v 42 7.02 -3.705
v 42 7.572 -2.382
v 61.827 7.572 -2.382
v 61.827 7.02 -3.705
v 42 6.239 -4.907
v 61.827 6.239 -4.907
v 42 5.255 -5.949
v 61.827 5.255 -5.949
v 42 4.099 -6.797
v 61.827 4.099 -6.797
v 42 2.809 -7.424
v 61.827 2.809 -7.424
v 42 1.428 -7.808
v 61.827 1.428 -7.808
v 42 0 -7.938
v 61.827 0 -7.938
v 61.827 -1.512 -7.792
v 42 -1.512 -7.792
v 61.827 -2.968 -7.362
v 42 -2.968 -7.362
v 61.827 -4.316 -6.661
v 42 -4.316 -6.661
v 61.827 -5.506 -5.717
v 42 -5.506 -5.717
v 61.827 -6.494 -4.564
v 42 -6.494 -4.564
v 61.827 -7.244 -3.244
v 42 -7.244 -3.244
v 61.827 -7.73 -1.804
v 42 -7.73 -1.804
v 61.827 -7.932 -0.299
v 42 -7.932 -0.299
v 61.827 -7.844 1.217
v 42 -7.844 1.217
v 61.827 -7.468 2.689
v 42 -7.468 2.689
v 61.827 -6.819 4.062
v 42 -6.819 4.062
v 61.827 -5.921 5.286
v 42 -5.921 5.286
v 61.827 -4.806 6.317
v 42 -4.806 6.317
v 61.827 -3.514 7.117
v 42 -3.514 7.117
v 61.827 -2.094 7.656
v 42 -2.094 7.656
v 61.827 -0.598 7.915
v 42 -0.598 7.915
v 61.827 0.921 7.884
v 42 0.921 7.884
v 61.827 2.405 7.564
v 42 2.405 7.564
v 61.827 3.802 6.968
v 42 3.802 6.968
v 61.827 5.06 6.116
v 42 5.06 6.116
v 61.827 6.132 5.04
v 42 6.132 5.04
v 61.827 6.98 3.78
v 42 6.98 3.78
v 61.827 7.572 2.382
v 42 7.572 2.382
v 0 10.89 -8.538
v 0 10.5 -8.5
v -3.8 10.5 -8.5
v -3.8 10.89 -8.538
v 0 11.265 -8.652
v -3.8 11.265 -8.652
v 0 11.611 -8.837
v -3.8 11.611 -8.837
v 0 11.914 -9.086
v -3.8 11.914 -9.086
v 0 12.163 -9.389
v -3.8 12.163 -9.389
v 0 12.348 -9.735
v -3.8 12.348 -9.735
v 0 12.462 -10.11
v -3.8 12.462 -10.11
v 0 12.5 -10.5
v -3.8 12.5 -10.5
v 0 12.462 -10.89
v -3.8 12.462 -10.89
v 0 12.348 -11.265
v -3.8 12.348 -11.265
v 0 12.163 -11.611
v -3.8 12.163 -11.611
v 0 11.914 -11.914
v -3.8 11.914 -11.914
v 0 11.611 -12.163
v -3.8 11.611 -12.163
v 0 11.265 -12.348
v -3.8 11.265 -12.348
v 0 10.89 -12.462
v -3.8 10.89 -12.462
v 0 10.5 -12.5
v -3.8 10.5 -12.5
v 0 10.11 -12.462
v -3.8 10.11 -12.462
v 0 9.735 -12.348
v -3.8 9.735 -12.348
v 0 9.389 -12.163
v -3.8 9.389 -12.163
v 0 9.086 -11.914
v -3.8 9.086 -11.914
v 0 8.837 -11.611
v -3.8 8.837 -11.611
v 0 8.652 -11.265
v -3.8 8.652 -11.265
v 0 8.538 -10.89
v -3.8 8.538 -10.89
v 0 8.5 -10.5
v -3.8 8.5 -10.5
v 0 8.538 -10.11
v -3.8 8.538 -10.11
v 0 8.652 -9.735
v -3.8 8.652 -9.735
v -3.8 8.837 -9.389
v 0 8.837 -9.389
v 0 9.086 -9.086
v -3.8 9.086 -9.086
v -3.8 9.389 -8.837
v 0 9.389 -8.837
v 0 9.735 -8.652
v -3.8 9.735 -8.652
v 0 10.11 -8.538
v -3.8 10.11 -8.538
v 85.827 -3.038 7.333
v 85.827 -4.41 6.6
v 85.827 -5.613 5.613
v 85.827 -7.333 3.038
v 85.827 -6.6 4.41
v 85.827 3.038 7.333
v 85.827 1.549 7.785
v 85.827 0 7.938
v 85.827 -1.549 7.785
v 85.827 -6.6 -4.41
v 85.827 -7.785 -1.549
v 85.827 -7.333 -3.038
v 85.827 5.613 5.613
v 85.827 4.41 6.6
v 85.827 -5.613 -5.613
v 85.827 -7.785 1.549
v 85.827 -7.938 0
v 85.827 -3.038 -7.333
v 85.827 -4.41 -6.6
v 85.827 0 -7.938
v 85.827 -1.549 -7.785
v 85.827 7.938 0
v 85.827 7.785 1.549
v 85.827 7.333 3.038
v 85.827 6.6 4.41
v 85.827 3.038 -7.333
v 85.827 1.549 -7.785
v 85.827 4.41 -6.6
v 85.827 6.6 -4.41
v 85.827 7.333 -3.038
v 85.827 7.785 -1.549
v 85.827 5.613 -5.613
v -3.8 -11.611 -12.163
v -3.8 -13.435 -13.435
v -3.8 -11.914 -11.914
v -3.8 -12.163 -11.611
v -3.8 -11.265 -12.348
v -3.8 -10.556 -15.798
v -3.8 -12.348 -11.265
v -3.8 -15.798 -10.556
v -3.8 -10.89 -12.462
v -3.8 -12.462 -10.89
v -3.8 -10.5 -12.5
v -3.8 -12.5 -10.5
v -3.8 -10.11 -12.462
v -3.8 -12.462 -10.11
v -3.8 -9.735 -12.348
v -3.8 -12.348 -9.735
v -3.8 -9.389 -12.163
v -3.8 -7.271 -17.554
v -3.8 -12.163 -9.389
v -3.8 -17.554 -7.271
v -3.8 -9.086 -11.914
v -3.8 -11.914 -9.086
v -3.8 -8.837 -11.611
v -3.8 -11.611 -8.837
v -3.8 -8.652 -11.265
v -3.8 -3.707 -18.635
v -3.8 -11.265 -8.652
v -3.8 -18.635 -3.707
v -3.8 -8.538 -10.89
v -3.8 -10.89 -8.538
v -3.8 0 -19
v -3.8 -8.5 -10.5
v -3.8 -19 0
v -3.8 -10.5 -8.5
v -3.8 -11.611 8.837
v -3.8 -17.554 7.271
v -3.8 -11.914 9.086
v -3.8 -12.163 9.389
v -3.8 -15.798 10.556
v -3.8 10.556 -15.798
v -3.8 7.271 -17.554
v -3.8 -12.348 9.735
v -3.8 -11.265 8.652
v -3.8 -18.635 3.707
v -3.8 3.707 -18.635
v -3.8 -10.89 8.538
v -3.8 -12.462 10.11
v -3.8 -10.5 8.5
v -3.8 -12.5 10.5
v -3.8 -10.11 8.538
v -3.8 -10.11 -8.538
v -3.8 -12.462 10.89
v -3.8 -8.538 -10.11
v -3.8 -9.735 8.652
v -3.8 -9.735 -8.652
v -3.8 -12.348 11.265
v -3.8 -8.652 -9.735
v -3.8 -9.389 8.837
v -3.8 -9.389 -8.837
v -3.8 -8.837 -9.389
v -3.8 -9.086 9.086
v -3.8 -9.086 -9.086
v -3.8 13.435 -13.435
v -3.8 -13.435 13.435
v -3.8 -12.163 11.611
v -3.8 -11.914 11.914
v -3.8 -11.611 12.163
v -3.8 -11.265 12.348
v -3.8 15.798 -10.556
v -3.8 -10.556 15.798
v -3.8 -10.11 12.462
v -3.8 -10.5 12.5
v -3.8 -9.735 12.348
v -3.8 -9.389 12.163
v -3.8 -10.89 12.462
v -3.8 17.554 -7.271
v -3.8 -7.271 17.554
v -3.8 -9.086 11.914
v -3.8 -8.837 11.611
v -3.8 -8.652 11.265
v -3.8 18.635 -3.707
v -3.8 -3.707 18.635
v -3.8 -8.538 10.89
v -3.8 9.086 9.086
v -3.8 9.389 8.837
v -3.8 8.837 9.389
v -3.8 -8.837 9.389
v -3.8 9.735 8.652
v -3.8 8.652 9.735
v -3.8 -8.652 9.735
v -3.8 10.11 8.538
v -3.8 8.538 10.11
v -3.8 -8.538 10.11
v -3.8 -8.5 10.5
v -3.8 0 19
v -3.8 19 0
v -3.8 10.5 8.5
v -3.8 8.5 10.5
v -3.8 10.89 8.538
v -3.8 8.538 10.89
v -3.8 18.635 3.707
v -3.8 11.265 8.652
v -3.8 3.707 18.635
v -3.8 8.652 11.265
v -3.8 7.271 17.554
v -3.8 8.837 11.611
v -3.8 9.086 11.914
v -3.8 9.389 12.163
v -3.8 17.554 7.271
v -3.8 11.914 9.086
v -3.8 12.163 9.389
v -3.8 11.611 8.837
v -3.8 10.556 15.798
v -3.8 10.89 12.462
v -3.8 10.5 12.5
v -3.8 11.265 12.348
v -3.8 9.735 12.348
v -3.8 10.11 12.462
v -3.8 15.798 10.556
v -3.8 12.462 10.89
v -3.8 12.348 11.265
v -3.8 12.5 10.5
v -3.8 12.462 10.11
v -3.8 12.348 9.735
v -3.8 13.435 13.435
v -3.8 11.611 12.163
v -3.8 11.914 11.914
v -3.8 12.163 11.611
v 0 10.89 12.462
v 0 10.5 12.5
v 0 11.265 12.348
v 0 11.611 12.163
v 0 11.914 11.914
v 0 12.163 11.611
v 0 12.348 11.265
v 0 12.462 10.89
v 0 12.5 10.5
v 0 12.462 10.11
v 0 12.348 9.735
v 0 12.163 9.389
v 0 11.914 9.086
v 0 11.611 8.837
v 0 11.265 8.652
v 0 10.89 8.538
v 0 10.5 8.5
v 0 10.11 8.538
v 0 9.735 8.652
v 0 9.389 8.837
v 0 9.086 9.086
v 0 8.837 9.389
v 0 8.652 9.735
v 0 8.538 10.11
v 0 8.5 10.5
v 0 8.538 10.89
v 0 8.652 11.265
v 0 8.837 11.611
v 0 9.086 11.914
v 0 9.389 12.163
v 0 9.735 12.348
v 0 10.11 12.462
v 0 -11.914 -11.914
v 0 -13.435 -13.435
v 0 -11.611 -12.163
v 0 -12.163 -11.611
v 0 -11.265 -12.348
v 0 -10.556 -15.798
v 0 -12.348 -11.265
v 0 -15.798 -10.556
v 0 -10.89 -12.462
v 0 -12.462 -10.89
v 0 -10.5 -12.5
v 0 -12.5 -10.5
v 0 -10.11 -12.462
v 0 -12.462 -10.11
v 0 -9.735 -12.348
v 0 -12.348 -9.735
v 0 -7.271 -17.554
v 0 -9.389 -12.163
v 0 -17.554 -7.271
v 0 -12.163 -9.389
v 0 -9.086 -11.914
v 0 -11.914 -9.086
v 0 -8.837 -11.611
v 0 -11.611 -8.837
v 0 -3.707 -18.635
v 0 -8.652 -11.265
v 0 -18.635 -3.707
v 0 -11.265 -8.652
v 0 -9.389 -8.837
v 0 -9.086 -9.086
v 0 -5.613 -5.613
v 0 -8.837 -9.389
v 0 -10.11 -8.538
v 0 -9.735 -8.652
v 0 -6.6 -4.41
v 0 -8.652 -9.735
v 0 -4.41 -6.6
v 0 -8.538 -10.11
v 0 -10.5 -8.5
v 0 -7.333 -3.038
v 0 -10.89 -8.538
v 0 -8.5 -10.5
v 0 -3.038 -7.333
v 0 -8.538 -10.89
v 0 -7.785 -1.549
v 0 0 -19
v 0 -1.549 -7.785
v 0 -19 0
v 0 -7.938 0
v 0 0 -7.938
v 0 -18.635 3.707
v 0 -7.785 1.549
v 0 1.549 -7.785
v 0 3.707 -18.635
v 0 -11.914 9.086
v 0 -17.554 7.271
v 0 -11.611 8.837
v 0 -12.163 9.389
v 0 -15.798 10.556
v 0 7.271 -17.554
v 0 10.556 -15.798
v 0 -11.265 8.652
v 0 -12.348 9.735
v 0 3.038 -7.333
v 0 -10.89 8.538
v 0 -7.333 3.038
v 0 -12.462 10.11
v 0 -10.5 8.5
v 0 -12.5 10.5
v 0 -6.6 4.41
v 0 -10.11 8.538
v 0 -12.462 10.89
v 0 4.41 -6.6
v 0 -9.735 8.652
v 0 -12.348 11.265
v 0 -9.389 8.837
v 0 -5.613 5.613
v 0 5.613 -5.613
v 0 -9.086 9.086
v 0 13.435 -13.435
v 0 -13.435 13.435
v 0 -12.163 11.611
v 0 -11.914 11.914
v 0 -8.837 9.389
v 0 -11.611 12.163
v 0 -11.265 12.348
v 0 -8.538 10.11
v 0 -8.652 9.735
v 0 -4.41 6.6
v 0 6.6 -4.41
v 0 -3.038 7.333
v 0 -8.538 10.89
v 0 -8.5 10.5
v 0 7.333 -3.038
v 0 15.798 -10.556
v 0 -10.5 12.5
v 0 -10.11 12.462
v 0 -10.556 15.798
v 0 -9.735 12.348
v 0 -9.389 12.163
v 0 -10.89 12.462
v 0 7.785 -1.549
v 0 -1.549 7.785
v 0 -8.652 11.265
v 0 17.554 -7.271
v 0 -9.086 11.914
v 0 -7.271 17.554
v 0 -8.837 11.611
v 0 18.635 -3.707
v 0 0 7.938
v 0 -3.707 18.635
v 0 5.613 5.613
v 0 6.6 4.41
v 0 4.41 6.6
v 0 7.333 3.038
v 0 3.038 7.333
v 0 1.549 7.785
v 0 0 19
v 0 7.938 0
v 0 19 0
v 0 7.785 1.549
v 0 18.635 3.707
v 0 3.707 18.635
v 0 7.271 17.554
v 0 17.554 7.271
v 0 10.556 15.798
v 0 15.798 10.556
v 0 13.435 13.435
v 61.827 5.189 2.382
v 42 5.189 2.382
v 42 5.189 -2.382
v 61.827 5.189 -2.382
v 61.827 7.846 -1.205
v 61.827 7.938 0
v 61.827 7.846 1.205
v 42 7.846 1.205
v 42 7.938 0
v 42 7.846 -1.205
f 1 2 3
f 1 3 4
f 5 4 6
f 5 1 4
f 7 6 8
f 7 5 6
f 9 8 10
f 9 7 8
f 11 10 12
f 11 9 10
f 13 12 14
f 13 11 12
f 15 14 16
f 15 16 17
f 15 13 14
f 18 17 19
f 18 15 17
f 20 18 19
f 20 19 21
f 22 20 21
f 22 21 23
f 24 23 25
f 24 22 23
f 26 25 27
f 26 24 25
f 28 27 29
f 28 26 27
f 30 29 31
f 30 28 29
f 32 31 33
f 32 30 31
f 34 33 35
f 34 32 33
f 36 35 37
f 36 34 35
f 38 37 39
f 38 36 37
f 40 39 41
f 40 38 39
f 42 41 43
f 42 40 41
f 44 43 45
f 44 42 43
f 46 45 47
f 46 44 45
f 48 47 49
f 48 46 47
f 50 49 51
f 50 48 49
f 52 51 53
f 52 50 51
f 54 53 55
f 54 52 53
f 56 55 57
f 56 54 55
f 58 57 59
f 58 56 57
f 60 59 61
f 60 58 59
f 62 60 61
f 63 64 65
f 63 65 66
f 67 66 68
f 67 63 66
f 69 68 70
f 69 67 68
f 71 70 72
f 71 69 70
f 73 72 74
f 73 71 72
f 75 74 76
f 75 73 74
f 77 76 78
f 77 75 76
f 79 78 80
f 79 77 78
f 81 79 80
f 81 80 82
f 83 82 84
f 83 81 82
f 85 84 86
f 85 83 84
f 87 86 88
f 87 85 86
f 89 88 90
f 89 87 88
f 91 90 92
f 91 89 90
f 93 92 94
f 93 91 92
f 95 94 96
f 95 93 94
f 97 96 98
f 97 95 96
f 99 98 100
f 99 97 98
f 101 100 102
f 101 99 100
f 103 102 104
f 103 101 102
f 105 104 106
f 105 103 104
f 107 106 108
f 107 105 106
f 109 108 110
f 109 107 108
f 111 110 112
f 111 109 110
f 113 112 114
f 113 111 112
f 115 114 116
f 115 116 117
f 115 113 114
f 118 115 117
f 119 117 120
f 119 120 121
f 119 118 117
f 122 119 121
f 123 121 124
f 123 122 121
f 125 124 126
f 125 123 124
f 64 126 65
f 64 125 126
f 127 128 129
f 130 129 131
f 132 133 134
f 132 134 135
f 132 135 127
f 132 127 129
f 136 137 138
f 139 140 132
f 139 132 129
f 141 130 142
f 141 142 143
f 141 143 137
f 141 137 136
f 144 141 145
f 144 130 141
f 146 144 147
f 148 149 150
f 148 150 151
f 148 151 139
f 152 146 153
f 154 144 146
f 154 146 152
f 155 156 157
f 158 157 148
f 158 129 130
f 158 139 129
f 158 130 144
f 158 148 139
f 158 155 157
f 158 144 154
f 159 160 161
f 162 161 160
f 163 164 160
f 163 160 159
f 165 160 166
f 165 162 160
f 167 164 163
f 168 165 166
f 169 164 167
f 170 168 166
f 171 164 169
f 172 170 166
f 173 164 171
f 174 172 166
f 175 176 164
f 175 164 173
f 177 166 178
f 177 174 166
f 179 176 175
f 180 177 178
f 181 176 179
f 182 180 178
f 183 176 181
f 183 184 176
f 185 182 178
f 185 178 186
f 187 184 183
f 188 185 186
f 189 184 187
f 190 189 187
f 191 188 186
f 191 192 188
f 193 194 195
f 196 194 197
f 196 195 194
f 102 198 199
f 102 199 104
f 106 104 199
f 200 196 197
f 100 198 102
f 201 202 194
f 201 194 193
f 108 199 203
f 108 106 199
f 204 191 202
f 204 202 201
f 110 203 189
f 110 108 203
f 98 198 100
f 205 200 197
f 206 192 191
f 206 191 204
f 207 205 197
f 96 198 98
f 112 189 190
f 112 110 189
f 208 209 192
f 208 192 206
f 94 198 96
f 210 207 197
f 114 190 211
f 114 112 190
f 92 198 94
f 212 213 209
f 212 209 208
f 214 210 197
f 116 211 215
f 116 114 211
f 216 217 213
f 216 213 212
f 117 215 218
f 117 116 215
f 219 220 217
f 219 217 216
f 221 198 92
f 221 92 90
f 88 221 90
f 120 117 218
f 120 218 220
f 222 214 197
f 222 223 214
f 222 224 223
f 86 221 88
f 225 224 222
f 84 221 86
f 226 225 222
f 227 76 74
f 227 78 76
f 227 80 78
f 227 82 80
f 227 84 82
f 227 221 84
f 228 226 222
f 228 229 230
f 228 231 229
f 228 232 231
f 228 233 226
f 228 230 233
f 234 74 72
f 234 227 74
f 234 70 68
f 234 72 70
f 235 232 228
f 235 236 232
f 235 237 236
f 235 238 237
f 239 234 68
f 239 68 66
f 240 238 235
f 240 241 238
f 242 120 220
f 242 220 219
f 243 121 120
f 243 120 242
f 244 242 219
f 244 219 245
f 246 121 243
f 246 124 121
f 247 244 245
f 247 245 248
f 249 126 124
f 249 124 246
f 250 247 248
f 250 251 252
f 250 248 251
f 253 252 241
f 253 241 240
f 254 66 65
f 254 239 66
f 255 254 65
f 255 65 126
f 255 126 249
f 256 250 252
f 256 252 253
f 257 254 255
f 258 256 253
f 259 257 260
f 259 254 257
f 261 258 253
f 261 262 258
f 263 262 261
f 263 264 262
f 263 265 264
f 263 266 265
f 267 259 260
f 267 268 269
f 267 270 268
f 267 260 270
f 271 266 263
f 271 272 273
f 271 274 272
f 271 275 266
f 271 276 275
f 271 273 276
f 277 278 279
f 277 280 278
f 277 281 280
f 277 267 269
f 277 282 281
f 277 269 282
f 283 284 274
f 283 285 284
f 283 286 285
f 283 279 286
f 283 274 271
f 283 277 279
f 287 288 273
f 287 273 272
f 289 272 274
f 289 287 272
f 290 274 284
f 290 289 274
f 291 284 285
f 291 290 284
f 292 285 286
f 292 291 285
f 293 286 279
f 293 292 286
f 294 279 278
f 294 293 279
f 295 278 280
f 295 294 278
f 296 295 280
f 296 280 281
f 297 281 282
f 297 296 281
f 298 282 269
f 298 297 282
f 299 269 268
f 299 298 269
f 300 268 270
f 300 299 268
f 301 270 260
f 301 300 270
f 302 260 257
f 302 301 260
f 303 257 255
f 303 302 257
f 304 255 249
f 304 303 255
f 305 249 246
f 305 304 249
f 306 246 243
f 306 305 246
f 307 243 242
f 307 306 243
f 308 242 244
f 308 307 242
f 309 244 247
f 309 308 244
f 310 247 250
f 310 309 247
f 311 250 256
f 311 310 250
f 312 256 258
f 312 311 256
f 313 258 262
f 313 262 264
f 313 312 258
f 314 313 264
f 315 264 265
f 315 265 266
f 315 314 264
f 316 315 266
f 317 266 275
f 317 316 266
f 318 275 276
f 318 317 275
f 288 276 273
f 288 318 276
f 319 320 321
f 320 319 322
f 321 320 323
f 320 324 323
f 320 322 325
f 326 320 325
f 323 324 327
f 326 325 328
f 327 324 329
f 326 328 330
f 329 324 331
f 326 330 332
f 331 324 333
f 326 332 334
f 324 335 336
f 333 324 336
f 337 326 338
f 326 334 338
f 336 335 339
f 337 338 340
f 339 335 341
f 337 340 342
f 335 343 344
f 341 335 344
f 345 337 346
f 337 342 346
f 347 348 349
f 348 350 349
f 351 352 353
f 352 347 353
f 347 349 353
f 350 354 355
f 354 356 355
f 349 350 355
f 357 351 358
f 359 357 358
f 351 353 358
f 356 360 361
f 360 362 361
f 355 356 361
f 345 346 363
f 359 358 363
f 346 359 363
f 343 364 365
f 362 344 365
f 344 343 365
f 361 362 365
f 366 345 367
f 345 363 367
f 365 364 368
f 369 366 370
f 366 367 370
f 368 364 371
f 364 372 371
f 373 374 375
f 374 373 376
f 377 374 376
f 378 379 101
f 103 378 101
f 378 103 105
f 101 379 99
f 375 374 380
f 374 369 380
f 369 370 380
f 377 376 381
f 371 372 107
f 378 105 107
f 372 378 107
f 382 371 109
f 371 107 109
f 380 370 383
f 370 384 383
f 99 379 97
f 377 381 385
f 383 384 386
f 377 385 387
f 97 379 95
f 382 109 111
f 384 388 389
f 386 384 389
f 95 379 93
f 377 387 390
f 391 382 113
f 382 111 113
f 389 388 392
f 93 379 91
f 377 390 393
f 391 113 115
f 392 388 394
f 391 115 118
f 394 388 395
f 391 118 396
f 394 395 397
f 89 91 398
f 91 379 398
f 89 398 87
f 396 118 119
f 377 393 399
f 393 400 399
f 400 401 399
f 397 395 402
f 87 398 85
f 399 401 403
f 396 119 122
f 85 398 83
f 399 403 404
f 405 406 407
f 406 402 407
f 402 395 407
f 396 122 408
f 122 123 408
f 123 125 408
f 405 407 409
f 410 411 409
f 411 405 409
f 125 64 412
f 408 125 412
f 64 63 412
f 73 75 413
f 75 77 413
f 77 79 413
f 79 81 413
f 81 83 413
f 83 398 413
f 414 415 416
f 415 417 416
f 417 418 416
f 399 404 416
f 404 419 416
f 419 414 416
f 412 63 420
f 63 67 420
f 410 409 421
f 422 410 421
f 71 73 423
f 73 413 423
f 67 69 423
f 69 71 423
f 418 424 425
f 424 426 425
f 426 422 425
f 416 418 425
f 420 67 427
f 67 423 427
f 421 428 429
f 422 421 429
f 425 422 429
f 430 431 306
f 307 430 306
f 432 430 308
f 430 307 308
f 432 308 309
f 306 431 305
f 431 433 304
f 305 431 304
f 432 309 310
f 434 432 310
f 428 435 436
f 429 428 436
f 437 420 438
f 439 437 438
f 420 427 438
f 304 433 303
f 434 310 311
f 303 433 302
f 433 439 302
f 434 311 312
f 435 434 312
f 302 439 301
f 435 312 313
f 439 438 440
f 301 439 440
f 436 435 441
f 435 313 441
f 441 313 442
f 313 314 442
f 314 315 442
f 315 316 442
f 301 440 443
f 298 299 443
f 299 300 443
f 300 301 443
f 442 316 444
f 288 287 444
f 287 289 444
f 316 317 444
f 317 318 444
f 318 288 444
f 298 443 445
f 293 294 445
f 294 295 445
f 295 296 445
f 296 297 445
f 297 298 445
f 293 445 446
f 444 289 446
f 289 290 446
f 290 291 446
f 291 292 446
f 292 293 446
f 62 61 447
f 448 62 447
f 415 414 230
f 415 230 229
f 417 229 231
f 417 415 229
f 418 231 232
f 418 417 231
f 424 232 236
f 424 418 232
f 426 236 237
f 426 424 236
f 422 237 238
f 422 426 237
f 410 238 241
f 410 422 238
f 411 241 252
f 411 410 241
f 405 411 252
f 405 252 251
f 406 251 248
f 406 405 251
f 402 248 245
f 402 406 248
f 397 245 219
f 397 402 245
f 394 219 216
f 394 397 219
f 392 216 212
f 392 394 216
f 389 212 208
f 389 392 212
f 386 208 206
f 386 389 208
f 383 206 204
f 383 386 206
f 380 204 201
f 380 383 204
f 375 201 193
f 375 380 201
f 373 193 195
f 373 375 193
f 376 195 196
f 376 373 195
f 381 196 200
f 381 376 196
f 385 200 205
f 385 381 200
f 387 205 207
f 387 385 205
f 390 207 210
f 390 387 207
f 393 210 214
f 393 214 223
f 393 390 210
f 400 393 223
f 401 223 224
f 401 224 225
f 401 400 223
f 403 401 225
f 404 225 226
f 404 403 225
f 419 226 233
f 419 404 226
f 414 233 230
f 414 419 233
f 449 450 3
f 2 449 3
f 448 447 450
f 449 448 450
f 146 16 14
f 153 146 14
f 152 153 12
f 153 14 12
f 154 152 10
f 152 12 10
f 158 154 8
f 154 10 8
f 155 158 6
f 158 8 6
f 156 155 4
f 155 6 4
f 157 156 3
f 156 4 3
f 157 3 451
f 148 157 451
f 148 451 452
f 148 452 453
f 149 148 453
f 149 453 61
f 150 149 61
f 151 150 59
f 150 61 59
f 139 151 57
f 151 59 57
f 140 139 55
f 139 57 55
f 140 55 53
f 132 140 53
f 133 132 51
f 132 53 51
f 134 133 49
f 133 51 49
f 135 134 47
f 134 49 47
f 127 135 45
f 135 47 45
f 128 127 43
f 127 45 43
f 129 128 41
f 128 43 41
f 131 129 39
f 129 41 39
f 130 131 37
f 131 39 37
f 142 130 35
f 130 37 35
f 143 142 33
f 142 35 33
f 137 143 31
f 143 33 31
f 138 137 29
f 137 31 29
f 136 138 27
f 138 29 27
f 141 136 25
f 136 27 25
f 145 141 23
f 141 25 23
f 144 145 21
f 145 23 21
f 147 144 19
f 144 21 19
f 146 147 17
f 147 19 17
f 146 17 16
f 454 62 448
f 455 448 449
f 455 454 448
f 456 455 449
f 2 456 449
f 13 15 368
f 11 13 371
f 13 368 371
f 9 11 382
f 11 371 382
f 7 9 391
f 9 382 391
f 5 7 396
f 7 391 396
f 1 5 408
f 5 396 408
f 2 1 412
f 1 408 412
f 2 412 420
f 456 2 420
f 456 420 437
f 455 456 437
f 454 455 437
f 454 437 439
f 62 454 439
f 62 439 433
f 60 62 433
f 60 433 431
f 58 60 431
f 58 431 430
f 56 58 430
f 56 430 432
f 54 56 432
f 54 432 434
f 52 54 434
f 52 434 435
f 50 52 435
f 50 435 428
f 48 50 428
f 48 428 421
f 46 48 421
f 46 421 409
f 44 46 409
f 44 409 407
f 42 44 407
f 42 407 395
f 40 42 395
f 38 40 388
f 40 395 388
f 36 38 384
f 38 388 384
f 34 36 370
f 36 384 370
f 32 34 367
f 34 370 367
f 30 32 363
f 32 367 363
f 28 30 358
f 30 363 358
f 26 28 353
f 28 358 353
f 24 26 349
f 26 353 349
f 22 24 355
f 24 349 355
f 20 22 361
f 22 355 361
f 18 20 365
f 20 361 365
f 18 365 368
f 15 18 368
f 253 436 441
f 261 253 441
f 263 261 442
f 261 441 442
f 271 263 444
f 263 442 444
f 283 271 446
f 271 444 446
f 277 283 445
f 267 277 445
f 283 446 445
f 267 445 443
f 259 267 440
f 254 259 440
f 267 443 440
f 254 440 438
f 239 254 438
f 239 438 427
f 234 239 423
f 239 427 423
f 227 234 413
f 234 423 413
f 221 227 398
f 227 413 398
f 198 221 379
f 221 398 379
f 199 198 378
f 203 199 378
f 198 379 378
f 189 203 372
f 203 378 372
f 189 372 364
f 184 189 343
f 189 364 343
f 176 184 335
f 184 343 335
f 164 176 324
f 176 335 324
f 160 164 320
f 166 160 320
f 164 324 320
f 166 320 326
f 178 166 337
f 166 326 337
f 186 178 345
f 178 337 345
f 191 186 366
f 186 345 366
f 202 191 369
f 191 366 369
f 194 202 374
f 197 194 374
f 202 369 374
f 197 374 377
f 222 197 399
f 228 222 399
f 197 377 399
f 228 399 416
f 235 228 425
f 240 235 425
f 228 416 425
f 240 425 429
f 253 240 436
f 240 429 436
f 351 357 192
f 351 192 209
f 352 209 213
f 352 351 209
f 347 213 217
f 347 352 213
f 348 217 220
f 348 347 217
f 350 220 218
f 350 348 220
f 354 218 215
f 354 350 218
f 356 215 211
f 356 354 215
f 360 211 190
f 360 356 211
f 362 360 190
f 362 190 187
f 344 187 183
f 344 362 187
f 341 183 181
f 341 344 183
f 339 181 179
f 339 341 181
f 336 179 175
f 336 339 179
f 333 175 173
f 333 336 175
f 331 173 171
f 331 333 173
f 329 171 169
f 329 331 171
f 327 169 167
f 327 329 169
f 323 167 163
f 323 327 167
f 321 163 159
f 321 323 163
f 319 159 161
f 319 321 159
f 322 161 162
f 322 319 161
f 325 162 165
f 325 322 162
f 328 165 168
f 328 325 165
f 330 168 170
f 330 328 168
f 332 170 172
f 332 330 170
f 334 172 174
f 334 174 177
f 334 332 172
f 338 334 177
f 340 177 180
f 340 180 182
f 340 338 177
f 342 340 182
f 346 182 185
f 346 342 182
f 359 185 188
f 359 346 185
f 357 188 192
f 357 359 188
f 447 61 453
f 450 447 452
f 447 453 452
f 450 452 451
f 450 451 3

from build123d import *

# Parameters (mm, degrees)
SKETCH1_R           = 7.9375
BOSS_EXTRUDE1_DEPTH = 42
SKETCH4_R           = 19
SKETCH4_R_2         = 2
BOSS_EXTRUDE3_DEPTH = 3.8
BOSS_EXTRUDE5_DEPTH = 19.8272
SKETCH7_R           = 7.9375
BOSS_EXTRUDE6_DEPTH = 24


with BuildPart() as part:
    # Sketch1 → Boss-Extrude1 (new body)
    with BuildSketch(Plane(origin=(0, 0, 0), x_dir=(0, 0, -1), z_dir=(1, 0, 0))):
        Circle(SKETCH1_R)
    extrude(amount=BOSS_EXTRUDE1_DEPTH)

    # Sketch4 → Boss-Extrude3 (add)
    with BuildSketch(Plane.ZY):
        Circle(SKETCH4_R)
        with Locations((-10.5, 10.5)):
            Circle(SKETCH4_R_2, mode=Mode.SUBTRACT)
        with Locations((10.5, 10.5)):
            Circle(SKETCH4_R_2, mode=Mode.SUBTRACT)
        with Locations((10.5, -10.5)):
            Circle(SKETCH4_R_2, mode=Mode.SUBTRACT)
        with Locations((-10.5, -10.5)):
            Circle(SKETCH4_R_2, mode=Mode.SUBTRACT)
    extrude(amount=BOSS_EXTRUDE3_DEPTH)

    # Sketch6 → Boss-Extrude5 (add)
    with BuildSketch(Plane(origin=(42, 0, 0), x_dir=(0, 0, -1), z_dir=(1, 0, 0))):
        with BuildLine():
            Line((-2.3815, 5.188813785), (2.3815, 5.188813785))
            Line((2.3815, 5.188813785), (2.3815, 7.571813785))
            ThreePointArc((2.3815, 7.571813785), (0, -7.9375), (-2.3815, 7.571813785))
            Line((-2.3815, 7.571813785), (-2.3815, 5.188813785))
        make_face()
    extrude(amount=BOSS_EXTRUDE5_DEPTH)

    # Sketch7 → Boss-Extrude6 (add)
    with BuildSketch(Plane(origin=(61.8272, 0, 0), x_dir=(0, 0, -1), z_dir=(1, 0, 0))):
        Circle(SKETCH7_R)
    extrude(amount=BOSS_EXTRUDE6_DEPTH)


solid = part.part
